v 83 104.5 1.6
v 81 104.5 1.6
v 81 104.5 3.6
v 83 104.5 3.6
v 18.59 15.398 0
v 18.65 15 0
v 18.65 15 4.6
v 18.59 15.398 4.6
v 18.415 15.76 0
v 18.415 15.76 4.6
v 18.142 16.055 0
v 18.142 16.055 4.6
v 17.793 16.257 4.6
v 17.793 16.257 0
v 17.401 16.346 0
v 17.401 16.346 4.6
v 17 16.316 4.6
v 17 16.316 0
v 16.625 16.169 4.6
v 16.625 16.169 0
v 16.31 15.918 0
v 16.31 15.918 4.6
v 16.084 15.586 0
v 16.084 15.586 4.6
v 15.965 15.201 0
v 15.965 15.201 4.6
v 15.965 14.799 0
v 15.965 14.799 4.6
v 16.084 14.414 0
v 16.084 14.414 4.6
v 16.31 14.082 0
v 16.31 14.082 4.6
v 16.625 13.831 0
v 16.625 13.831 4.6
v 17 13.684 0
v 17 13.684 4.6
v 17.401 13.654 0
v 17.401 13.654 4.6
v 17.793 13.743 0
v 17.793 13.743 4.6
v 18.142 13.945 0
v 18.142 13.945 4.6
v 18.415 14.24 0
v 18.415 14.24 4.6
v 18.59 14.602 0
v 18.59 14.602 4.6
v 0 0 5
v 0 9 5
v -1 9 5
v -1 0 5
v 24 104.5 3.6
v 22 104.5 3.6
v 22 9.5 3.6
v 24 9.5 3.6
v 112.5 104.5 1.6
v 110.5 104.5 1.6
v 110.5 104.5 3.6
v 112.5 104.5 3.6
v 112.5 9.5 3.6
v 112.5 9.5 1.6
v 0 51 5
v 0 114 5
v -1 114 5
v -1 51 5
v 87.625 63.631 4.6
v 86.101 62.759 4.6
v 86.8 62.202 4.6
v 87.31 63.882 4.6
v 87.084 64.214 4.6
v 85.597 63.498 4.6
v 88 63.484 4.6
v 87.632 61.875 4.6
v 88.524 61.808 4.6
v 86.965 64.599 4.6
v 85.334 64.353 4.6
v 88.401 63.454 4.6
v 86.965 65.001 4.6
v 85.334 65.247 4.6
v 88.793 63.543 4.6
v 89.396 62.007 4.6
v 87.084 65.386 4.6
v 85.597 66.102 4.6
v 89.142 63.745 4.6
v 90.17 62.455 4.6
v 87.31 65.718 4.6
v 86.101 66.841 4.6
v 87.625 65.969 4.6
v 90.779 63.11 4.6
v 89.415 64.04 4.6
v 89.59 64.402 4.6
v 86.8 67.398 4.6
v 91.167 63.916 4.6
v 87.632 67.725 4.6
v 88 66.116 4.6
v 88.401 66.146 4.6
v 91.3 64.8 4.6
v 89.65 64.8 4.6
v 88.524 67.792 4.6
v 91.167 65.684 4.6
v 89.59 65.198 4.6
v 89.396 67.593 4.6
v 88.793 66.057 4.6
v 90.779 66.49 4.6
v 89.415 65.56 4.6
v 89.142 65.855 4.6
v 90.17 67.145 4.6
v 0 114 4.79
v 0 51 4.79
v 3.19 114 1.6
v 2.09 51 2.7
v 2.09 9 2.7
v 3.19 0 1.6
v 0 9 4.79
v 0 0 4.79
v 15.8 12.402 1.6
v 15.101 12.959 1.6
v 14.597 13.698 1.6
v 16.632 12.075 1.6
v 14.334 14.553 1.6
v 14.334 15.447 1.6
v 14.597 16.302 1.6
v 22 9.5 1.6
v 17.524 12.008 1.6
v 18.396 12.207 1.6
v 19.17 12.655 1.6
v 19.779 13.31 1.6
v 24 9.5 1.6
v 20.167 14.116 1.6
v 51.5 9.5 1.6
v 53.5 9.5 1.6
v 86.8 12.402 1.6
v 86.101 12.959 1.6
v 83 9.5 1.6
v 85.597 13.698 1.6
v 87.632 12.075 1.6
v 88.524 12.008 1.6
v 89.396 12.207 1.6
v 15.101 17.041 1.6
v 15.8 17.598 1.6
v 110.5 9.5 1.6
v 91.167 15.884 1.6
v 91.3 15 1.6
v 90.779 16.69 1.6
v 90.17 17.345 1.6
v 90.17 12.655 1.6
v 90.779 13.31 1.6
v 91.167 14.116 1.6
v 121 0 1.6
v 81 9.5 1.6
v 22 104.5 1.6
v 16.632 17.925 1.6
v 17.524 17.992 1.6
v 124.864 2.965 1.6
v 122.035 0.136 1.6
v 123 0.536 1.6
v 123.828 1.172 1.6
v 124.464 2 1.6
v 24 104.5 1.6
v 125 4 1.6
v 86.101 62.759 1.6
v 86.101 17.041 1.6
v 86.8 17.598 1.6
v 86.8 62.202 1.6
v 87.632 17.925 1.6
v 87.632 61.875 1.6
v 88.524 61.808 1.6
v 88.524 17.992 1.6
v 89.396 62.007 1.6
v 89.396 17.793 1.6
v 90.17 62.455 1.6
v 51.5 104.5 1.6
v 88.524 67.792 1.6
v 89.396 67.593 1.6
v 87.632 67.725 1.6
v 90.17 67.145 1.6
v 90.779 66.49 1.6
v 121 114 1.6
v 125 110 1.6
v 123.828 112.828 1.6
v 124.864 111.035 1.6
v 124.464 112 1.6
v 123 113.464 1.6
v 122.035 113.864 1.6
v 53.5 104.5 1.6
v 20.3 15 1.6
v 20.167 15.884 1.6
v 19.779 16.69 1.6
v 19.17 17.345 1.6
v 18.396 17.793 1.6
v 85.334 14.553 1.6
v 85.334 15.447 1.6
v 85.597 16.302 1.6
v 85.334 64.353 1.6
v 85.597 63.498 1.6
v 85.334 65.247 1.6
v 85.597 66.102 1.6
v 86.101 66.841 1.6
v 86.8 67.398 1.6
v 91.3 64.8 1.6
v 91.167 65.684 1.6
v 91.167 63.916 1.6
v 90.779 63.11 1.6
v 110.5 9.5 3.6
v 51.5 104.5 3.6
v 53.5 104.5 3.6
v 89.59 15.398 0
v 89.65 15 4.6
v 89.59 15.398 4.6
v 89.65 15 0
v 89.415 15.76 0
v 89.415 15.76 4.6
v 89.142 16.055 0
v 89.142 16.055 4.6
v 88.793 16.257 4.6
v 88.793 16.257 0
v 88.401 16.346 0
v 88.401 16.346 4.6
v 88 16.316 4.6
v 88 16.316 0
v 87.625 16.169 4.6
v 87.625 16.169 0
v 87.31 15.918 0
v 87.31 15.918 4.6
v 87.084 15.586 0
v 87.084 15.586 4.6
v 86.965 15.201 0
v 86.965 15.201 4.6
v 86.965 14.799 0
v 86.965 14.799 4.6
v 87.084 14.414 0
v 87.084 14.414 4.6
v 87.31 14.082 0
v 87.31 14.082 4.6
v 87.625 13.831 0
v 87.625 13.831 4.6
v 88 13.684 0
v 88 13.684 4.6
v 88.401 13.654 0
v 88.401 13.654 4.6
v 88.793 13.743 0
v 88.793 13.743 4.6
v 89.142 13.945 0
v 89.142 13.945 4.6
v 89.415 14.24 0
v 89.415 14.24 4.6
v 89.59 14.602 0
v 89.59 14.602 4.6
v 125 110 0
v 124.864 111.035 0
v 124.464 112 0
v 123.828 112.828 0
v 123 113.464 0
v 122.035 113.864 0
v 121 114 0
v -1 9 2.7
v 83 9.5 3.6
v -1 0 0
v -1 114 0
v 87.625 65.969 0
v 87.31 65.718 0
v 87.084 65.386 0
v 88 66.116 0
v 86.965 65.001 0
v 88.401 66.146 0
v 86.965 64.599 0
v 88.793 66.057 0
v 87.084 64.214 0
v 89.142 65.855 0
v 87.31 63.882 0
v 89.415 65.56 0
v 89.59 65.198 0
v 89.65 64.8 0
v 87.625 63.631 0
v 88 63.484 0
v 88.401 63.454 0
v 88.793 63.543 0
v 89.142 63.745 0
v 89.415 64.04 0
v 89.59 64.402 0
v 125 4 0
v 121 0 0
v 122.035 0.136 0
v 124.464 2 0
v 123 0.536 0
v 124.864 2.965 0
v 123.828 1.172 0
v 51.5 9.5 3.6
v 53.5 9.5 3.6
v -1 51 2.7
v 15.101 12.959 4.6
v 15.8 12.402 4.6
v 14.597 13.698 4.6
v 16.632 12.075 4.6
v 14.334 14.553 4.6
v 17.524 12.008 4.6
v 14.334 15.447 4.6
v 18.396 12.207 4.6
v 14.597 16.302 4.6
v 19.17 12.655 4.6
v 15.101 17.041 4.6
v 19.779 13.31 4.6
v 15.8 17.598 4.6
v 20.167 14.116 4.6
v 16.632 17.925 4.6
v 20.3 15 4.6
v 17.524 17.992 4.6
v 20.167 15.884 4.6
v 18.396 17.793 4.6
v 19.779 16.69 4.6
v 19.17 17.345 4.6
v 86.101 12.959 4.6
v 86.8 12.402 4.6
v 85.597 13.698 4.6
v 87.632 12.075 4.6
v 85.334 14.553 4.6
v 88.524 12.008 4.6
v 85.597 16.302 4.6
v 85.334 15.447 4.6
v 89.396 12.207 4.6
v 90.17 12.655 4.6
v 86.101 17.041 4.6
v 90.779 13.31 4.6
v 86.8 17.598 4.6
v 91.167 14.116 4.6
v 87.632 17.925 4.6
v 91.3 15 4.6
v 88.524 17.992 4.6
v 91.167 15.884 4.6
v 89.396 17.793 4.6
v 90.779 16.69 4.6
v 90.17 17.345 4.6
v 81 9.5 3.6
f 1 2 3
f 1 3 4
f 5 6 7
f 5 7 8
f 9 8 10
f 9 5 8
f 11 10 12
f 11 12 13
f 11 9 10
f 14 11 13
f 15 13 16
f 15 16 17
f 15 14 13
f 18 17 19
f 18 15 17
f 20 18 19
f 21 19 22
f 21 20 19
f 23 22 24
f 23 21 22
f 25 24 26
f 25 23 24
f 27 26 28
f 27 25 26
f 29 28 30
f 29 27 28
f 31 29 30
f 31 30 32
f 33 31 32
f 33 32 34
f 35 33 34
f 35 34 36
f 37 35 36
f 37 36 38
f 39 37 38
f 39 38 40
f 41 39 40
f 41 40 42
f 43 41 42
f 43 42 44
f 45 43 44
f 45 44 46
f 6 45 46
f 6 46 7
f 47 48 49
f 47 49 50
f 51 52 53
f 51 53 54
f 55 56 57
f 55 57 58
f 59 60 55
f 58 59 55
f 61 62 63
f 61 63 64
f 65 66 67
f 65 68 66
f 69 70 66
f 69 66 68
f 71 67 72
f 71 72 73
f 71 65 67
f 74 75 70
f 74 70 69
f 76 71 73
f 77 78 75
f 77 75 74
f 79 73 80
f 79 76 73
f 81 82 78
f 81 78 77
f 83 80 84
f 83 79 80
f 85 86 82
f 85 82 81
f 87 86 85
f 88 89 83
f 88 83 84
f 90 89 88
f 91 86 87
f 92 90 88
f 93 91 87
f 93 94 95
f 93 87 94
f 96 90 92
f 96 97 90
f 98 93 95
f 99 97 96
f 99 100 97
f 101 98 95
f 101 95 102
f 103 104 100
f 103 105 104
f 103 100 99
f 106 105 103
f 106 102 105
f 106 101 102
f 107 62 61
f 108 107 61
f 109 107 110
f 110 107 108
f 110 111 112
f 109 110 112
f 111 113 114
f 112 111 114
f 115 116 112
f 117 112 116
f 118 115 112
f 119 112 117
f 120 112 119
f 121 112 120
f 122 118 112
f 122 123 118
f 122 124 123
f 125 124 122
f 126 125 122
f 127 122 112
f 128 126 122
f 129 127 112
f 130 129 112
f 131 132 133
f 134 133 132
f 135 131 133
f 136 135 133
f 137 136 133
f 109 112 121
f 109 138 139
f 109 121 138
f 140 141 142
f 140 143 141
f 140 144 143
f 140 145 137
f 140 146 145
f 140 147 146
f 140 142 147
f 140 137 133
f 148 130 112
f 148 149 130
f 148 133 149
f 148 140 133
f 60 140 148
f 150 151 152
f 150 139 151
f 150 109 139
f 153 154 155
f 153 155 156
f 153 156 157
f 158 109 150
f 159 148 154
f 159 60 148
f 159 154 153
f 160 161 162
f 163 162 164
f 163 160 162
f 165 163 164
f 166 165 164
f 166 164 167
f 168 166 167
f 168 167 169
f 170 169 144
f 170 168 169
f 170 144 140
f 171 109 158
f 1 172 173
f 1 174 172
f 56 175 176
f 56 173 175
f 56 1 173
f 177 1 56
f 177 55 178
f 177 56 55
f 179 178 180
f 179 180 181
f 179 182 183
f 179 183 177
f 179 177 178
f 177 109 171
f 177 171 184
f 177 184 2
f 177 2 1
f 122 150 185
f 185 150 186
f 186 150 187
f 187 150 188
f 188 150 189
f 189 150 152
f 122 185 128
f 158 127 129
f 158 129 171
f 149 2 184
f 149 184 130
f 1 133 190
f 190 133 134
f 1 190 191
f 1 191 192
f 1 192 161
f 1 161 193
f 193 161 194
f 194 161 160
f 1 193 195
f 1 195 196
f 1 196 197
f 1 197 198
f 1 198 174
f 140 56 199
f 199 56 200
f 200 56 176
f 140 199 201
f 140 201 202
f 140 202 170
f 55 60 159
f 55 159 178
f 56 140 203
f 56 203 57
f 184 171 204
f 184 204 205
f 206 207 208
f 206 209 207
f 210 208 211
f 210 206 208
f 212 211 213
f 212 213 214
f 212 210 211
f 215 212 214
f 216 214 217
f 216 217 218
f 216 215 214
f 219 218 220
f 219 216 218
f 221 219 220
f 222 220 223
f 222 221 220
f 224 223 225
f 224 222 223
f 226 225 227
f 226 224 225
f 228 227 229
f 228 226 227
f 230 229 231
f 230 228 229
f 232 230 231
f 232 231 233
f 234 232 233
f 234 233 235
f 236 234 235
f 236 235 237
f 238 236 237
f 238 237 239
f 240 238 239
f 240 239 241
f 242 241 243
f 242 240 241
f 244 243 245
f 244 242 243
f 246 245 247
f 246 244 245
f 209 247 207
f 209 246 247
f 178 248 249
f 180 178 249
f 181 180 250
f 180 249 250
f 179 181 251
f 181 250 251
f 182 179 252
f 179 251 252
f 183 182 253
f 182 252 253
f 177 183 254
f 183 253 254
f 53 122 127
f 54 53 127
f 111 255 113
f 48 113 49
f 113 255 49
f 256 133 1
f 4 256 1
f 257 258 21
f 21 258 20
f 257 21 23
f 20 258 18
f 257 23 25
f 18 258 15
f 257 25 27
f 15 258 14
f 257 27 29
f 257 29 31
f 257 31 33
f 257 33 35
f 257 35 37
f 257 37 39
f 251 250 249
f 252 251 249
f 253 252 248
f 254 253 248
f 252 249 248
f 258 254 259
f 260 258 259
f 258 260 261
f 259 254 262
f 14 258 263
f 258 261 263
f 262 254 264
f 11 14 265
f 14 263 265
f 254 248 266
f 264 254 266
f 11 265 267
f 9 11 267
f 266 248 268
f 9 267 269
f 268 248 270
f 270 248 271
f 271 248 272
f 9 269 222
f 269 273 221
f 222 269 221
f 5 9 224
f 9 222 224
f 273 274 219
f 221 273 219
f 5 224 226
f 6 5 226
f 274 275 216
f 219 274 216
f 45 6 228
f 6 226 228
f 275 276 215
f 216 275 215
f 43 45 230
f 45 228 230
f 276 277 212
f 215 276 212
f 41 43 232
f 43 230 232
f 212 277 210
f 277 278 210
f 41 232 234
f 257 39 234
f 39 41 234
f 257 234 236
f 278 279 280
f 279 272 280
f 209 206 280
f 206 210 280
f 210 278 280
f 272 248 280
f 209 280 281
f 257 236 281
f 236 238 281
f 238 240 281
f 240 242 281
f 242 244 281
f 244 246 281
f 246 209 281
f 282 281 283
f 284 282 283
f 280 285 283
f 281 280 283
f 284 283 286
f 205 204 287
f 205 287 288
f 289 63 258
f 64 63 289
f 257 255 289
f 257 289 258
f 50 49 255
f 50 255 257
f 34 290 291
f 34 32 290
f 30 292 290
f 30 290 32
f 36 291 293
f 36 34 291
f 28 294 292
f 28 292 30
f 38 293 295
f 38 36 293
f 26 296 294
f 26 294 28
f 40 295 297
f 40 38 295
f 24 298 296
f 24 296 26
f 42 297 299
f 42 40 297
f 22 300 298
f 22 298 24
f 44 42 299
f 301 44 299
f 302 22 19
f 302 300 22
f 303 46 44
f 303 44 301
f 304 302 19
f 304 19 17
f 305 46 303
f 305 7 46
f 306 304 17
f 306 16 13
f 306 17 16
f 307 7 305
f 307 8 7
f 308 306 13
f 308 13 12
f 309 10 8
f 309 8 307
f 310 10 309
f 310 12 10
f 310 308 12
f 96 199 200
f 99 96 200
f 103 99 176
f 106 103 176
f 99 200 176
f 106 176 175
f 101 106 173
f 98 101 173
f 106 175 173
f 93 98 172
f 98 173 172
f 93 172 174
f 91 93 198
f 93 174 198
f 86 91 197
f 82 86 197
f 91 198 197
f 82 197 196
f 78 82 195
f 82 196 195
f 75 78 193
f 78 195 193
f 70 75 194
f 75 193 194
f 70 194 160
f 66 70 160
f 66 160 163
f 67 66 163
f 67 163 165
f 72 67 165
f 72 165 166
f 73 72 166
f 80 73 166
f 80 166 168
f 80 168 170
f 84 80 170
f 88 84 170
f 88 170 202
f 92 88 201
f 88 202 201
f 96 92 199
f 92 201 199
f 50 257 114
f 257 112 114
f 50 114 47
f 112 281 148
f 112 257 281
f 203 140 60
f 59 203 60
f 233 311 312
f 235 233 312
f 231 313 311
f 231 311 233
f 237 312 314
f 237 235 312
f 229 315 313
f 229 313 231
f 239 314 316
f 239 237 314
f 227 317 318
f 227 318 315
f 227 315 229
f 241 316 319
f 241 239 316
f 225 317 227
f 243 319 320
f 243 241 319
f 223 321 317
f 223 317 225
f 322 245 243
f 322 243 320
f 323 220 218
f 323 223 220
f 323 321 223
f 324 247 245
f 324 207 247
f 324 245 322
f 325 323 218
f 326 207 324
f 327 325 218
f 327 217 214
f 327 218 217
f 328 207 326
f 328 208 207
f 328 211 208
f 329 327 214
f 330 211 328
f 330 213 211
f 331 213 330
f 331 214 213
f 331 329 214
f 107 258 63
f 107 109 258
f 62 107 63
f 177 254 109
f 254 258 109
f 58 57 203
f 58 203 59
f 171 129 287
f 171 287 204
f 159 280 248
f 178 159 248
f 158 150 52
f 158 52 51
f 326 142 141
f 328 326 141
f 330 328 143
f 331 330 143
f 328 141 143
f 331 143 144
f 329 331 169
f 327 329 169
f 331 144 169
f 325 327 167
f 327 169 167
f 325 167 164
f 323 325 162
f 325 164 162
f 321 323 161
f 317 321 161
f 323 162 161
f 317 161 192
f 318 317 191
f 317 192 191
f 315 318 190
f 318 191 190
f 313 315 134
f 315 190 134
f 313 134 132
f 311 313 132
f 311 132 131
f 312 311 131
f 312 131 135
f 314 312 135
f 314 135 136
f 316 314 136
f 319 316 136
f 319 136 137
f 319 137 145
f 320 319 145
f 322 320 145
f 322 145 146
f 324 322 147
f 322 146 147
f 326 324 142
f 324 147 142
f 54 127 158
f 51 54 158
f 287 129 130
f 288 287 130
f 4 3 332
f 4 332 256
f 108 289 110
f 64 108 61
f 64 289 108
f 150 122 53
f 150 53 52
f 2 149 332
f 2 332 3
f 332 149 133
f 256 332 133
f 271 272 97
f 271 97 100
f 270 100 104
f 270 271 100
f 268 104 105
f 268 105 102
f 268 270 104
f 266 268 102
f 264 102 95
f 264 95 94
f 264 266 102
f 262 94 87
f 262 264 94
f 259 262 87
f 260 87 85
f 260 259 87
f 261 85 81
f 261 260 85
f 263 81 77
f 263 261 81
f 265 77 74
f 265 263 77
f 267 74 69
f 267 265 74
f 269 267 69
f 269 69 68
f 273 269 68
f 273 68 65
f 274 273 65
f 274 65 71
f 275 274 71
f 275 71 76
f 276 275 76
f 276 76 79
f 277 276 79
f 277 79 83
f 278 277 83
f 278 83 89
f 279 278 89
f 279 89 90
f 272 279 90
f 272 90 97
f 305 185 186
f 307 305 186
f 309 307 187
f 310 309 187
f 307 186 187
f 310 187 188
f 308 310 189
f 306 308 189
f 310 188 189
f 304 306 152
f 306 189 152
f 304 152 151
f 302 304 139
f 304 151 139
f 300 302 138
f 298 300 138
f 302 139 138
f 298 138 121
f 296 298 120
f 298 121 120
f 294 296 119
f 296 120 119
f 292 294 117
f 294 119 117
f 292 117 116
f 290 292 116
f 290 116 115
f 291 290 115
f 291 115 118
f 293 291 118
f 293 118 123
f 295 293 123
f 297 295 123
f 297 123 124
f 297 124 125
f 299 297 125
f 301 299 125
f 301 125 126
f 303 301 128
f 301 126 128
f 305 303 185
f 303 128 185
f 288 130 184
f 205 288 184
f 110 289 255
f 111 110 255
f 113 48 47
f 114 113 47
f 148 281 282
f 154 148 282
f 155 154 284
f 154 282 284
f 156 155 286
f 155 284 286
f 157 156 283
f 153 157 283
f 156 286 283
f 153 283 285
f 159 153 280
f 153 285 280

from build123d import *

# Parameters (mm, degrees)
SKETCH_R      = 1.35
PAD_DEPTH     = 1.6
SKETCH001_R   = 3
SKETCH001_R_2 = 1.35
PAD001_DEPTH  = 3
SKETCH002_W   = 2
SKETCH002_H   = 95
PAD002_DEPTH  = 2
SKETCH003_W   = 114
SKETCH003_H   = 5
PAD003_DEPTH  = 1
CHAMFER_SIZE  = 3.19
SKETCH004_W   = 42
SKETCH004_H   = 2.3
POCKET_DEPTH  = 5


with BuildPart() as part:
    # Sketch → Pad (new body)
    with BuildSketch(Plane.XY):
        with BuildLine():
            Line((0, 0), (121, 0))
            ThreePointArc((121, 0), (123.828427, 1.171573), (125, 4))
            Line((125, 4), (125, 110))
            ThreePointArc((125, 110), (123.828427, 112.828427), (121, 114))
            Line((121, 114), (0, 114))
            Line((0, 114), (0, 0))
        make_face()
        with Locations((17.3, 15)):
            Circle(SKETCH_R, mode=Mode.SUBTRACT)
        with Locations((88.3, 64.8)):
            Circle(SKETCH_R, mode=Mode.SUBTRACT)
        with Locations((88.3, 15)):
            Circle(SKETCH_R, mode=Mode.SUBTRACT)
    extrude(amount=PAD_DEPTH)

    # Sketch001 (on Face11 of Pad) → Pad001 (join)
    with BuildSketch(Plane.XY.offset(1.6)):
        with Locations((88.3, 15)):
            Circle(SKETCH001_R)
        with Locations((88.3, 15)):
            Circle(SKETCH001_R_2, mode=Mode.SUBTRACT)
        with Locations((88.3, 64.8)):
            Circle(SKETCH001_R)
        with Locations((88.3, 64.8)):
            Circle(SKETCH001_R_2, mode=Mode.SUBTRACT)
        with Locations((17.3, 15)):
            Circle(SKETCH001_R)
        with Locations((17.3, 15)):
            Circle(SKETCH001_R_2, mode=Mode.SUBTRACT)
    extrude(amount=PAD001_DEPTH)

    # Sketch002 (on Face5 of Pad001) → Pad002 (join)
    with BuildSketch(Plane.XY.offset(1.6)):
        with Locations((23, 57)):
            Rectangle(SKETCH002_W, SKETCH002_H)
        with Locations((52.5, 57)):
            Rectangle(SKETCH002_W, SKETCH002_H)
        with Locations((82, 57)):
            Rectangle(SKETCH002_W, SKETCH002_H)
        with Locations((111.5, 57)):
            Rectangle(SKETCH002_W, SKETCH002_H)
    extrude(amount=PAD002_DEPTH)

    # Sketch003 (on Face2 of Pad002) → Pad003 (join)
    with BuildSketch(Plane(origin=(0, 0, 0), x_dir=(0, -1, 0), z_dir=(-1, 0, 0))):
        with Locations((-57, 2.5)):
            Rectangle(SKETCH003_W, SKETCH003_H)
    extrude(amount=PAD003_DEPTH)

    # Chamfer
    chamfer_edges = [part.edges().sort_by_distance(p)[0] for p in [
        (0, 57, 1.6),
    ]]
    chamfer(chamfer_edges, length=CHAMFER_SIZE)

    # Sketch004 (on Face31 of Chamfer) → Pocket (cut)
    with BuildSketch(Plane(origin=(-1, 0, 0), x_dir=(0, -1, 0), z_dir=(-1, 0, 0))):
        with Locations((-30, 3.85)):
            Rectangle(SKETCH004_W, SKETCH004_H)
    extrude(amount=-POCKET_DEPTH, mode=Mode.SUBTRACT)


solid = part.part
